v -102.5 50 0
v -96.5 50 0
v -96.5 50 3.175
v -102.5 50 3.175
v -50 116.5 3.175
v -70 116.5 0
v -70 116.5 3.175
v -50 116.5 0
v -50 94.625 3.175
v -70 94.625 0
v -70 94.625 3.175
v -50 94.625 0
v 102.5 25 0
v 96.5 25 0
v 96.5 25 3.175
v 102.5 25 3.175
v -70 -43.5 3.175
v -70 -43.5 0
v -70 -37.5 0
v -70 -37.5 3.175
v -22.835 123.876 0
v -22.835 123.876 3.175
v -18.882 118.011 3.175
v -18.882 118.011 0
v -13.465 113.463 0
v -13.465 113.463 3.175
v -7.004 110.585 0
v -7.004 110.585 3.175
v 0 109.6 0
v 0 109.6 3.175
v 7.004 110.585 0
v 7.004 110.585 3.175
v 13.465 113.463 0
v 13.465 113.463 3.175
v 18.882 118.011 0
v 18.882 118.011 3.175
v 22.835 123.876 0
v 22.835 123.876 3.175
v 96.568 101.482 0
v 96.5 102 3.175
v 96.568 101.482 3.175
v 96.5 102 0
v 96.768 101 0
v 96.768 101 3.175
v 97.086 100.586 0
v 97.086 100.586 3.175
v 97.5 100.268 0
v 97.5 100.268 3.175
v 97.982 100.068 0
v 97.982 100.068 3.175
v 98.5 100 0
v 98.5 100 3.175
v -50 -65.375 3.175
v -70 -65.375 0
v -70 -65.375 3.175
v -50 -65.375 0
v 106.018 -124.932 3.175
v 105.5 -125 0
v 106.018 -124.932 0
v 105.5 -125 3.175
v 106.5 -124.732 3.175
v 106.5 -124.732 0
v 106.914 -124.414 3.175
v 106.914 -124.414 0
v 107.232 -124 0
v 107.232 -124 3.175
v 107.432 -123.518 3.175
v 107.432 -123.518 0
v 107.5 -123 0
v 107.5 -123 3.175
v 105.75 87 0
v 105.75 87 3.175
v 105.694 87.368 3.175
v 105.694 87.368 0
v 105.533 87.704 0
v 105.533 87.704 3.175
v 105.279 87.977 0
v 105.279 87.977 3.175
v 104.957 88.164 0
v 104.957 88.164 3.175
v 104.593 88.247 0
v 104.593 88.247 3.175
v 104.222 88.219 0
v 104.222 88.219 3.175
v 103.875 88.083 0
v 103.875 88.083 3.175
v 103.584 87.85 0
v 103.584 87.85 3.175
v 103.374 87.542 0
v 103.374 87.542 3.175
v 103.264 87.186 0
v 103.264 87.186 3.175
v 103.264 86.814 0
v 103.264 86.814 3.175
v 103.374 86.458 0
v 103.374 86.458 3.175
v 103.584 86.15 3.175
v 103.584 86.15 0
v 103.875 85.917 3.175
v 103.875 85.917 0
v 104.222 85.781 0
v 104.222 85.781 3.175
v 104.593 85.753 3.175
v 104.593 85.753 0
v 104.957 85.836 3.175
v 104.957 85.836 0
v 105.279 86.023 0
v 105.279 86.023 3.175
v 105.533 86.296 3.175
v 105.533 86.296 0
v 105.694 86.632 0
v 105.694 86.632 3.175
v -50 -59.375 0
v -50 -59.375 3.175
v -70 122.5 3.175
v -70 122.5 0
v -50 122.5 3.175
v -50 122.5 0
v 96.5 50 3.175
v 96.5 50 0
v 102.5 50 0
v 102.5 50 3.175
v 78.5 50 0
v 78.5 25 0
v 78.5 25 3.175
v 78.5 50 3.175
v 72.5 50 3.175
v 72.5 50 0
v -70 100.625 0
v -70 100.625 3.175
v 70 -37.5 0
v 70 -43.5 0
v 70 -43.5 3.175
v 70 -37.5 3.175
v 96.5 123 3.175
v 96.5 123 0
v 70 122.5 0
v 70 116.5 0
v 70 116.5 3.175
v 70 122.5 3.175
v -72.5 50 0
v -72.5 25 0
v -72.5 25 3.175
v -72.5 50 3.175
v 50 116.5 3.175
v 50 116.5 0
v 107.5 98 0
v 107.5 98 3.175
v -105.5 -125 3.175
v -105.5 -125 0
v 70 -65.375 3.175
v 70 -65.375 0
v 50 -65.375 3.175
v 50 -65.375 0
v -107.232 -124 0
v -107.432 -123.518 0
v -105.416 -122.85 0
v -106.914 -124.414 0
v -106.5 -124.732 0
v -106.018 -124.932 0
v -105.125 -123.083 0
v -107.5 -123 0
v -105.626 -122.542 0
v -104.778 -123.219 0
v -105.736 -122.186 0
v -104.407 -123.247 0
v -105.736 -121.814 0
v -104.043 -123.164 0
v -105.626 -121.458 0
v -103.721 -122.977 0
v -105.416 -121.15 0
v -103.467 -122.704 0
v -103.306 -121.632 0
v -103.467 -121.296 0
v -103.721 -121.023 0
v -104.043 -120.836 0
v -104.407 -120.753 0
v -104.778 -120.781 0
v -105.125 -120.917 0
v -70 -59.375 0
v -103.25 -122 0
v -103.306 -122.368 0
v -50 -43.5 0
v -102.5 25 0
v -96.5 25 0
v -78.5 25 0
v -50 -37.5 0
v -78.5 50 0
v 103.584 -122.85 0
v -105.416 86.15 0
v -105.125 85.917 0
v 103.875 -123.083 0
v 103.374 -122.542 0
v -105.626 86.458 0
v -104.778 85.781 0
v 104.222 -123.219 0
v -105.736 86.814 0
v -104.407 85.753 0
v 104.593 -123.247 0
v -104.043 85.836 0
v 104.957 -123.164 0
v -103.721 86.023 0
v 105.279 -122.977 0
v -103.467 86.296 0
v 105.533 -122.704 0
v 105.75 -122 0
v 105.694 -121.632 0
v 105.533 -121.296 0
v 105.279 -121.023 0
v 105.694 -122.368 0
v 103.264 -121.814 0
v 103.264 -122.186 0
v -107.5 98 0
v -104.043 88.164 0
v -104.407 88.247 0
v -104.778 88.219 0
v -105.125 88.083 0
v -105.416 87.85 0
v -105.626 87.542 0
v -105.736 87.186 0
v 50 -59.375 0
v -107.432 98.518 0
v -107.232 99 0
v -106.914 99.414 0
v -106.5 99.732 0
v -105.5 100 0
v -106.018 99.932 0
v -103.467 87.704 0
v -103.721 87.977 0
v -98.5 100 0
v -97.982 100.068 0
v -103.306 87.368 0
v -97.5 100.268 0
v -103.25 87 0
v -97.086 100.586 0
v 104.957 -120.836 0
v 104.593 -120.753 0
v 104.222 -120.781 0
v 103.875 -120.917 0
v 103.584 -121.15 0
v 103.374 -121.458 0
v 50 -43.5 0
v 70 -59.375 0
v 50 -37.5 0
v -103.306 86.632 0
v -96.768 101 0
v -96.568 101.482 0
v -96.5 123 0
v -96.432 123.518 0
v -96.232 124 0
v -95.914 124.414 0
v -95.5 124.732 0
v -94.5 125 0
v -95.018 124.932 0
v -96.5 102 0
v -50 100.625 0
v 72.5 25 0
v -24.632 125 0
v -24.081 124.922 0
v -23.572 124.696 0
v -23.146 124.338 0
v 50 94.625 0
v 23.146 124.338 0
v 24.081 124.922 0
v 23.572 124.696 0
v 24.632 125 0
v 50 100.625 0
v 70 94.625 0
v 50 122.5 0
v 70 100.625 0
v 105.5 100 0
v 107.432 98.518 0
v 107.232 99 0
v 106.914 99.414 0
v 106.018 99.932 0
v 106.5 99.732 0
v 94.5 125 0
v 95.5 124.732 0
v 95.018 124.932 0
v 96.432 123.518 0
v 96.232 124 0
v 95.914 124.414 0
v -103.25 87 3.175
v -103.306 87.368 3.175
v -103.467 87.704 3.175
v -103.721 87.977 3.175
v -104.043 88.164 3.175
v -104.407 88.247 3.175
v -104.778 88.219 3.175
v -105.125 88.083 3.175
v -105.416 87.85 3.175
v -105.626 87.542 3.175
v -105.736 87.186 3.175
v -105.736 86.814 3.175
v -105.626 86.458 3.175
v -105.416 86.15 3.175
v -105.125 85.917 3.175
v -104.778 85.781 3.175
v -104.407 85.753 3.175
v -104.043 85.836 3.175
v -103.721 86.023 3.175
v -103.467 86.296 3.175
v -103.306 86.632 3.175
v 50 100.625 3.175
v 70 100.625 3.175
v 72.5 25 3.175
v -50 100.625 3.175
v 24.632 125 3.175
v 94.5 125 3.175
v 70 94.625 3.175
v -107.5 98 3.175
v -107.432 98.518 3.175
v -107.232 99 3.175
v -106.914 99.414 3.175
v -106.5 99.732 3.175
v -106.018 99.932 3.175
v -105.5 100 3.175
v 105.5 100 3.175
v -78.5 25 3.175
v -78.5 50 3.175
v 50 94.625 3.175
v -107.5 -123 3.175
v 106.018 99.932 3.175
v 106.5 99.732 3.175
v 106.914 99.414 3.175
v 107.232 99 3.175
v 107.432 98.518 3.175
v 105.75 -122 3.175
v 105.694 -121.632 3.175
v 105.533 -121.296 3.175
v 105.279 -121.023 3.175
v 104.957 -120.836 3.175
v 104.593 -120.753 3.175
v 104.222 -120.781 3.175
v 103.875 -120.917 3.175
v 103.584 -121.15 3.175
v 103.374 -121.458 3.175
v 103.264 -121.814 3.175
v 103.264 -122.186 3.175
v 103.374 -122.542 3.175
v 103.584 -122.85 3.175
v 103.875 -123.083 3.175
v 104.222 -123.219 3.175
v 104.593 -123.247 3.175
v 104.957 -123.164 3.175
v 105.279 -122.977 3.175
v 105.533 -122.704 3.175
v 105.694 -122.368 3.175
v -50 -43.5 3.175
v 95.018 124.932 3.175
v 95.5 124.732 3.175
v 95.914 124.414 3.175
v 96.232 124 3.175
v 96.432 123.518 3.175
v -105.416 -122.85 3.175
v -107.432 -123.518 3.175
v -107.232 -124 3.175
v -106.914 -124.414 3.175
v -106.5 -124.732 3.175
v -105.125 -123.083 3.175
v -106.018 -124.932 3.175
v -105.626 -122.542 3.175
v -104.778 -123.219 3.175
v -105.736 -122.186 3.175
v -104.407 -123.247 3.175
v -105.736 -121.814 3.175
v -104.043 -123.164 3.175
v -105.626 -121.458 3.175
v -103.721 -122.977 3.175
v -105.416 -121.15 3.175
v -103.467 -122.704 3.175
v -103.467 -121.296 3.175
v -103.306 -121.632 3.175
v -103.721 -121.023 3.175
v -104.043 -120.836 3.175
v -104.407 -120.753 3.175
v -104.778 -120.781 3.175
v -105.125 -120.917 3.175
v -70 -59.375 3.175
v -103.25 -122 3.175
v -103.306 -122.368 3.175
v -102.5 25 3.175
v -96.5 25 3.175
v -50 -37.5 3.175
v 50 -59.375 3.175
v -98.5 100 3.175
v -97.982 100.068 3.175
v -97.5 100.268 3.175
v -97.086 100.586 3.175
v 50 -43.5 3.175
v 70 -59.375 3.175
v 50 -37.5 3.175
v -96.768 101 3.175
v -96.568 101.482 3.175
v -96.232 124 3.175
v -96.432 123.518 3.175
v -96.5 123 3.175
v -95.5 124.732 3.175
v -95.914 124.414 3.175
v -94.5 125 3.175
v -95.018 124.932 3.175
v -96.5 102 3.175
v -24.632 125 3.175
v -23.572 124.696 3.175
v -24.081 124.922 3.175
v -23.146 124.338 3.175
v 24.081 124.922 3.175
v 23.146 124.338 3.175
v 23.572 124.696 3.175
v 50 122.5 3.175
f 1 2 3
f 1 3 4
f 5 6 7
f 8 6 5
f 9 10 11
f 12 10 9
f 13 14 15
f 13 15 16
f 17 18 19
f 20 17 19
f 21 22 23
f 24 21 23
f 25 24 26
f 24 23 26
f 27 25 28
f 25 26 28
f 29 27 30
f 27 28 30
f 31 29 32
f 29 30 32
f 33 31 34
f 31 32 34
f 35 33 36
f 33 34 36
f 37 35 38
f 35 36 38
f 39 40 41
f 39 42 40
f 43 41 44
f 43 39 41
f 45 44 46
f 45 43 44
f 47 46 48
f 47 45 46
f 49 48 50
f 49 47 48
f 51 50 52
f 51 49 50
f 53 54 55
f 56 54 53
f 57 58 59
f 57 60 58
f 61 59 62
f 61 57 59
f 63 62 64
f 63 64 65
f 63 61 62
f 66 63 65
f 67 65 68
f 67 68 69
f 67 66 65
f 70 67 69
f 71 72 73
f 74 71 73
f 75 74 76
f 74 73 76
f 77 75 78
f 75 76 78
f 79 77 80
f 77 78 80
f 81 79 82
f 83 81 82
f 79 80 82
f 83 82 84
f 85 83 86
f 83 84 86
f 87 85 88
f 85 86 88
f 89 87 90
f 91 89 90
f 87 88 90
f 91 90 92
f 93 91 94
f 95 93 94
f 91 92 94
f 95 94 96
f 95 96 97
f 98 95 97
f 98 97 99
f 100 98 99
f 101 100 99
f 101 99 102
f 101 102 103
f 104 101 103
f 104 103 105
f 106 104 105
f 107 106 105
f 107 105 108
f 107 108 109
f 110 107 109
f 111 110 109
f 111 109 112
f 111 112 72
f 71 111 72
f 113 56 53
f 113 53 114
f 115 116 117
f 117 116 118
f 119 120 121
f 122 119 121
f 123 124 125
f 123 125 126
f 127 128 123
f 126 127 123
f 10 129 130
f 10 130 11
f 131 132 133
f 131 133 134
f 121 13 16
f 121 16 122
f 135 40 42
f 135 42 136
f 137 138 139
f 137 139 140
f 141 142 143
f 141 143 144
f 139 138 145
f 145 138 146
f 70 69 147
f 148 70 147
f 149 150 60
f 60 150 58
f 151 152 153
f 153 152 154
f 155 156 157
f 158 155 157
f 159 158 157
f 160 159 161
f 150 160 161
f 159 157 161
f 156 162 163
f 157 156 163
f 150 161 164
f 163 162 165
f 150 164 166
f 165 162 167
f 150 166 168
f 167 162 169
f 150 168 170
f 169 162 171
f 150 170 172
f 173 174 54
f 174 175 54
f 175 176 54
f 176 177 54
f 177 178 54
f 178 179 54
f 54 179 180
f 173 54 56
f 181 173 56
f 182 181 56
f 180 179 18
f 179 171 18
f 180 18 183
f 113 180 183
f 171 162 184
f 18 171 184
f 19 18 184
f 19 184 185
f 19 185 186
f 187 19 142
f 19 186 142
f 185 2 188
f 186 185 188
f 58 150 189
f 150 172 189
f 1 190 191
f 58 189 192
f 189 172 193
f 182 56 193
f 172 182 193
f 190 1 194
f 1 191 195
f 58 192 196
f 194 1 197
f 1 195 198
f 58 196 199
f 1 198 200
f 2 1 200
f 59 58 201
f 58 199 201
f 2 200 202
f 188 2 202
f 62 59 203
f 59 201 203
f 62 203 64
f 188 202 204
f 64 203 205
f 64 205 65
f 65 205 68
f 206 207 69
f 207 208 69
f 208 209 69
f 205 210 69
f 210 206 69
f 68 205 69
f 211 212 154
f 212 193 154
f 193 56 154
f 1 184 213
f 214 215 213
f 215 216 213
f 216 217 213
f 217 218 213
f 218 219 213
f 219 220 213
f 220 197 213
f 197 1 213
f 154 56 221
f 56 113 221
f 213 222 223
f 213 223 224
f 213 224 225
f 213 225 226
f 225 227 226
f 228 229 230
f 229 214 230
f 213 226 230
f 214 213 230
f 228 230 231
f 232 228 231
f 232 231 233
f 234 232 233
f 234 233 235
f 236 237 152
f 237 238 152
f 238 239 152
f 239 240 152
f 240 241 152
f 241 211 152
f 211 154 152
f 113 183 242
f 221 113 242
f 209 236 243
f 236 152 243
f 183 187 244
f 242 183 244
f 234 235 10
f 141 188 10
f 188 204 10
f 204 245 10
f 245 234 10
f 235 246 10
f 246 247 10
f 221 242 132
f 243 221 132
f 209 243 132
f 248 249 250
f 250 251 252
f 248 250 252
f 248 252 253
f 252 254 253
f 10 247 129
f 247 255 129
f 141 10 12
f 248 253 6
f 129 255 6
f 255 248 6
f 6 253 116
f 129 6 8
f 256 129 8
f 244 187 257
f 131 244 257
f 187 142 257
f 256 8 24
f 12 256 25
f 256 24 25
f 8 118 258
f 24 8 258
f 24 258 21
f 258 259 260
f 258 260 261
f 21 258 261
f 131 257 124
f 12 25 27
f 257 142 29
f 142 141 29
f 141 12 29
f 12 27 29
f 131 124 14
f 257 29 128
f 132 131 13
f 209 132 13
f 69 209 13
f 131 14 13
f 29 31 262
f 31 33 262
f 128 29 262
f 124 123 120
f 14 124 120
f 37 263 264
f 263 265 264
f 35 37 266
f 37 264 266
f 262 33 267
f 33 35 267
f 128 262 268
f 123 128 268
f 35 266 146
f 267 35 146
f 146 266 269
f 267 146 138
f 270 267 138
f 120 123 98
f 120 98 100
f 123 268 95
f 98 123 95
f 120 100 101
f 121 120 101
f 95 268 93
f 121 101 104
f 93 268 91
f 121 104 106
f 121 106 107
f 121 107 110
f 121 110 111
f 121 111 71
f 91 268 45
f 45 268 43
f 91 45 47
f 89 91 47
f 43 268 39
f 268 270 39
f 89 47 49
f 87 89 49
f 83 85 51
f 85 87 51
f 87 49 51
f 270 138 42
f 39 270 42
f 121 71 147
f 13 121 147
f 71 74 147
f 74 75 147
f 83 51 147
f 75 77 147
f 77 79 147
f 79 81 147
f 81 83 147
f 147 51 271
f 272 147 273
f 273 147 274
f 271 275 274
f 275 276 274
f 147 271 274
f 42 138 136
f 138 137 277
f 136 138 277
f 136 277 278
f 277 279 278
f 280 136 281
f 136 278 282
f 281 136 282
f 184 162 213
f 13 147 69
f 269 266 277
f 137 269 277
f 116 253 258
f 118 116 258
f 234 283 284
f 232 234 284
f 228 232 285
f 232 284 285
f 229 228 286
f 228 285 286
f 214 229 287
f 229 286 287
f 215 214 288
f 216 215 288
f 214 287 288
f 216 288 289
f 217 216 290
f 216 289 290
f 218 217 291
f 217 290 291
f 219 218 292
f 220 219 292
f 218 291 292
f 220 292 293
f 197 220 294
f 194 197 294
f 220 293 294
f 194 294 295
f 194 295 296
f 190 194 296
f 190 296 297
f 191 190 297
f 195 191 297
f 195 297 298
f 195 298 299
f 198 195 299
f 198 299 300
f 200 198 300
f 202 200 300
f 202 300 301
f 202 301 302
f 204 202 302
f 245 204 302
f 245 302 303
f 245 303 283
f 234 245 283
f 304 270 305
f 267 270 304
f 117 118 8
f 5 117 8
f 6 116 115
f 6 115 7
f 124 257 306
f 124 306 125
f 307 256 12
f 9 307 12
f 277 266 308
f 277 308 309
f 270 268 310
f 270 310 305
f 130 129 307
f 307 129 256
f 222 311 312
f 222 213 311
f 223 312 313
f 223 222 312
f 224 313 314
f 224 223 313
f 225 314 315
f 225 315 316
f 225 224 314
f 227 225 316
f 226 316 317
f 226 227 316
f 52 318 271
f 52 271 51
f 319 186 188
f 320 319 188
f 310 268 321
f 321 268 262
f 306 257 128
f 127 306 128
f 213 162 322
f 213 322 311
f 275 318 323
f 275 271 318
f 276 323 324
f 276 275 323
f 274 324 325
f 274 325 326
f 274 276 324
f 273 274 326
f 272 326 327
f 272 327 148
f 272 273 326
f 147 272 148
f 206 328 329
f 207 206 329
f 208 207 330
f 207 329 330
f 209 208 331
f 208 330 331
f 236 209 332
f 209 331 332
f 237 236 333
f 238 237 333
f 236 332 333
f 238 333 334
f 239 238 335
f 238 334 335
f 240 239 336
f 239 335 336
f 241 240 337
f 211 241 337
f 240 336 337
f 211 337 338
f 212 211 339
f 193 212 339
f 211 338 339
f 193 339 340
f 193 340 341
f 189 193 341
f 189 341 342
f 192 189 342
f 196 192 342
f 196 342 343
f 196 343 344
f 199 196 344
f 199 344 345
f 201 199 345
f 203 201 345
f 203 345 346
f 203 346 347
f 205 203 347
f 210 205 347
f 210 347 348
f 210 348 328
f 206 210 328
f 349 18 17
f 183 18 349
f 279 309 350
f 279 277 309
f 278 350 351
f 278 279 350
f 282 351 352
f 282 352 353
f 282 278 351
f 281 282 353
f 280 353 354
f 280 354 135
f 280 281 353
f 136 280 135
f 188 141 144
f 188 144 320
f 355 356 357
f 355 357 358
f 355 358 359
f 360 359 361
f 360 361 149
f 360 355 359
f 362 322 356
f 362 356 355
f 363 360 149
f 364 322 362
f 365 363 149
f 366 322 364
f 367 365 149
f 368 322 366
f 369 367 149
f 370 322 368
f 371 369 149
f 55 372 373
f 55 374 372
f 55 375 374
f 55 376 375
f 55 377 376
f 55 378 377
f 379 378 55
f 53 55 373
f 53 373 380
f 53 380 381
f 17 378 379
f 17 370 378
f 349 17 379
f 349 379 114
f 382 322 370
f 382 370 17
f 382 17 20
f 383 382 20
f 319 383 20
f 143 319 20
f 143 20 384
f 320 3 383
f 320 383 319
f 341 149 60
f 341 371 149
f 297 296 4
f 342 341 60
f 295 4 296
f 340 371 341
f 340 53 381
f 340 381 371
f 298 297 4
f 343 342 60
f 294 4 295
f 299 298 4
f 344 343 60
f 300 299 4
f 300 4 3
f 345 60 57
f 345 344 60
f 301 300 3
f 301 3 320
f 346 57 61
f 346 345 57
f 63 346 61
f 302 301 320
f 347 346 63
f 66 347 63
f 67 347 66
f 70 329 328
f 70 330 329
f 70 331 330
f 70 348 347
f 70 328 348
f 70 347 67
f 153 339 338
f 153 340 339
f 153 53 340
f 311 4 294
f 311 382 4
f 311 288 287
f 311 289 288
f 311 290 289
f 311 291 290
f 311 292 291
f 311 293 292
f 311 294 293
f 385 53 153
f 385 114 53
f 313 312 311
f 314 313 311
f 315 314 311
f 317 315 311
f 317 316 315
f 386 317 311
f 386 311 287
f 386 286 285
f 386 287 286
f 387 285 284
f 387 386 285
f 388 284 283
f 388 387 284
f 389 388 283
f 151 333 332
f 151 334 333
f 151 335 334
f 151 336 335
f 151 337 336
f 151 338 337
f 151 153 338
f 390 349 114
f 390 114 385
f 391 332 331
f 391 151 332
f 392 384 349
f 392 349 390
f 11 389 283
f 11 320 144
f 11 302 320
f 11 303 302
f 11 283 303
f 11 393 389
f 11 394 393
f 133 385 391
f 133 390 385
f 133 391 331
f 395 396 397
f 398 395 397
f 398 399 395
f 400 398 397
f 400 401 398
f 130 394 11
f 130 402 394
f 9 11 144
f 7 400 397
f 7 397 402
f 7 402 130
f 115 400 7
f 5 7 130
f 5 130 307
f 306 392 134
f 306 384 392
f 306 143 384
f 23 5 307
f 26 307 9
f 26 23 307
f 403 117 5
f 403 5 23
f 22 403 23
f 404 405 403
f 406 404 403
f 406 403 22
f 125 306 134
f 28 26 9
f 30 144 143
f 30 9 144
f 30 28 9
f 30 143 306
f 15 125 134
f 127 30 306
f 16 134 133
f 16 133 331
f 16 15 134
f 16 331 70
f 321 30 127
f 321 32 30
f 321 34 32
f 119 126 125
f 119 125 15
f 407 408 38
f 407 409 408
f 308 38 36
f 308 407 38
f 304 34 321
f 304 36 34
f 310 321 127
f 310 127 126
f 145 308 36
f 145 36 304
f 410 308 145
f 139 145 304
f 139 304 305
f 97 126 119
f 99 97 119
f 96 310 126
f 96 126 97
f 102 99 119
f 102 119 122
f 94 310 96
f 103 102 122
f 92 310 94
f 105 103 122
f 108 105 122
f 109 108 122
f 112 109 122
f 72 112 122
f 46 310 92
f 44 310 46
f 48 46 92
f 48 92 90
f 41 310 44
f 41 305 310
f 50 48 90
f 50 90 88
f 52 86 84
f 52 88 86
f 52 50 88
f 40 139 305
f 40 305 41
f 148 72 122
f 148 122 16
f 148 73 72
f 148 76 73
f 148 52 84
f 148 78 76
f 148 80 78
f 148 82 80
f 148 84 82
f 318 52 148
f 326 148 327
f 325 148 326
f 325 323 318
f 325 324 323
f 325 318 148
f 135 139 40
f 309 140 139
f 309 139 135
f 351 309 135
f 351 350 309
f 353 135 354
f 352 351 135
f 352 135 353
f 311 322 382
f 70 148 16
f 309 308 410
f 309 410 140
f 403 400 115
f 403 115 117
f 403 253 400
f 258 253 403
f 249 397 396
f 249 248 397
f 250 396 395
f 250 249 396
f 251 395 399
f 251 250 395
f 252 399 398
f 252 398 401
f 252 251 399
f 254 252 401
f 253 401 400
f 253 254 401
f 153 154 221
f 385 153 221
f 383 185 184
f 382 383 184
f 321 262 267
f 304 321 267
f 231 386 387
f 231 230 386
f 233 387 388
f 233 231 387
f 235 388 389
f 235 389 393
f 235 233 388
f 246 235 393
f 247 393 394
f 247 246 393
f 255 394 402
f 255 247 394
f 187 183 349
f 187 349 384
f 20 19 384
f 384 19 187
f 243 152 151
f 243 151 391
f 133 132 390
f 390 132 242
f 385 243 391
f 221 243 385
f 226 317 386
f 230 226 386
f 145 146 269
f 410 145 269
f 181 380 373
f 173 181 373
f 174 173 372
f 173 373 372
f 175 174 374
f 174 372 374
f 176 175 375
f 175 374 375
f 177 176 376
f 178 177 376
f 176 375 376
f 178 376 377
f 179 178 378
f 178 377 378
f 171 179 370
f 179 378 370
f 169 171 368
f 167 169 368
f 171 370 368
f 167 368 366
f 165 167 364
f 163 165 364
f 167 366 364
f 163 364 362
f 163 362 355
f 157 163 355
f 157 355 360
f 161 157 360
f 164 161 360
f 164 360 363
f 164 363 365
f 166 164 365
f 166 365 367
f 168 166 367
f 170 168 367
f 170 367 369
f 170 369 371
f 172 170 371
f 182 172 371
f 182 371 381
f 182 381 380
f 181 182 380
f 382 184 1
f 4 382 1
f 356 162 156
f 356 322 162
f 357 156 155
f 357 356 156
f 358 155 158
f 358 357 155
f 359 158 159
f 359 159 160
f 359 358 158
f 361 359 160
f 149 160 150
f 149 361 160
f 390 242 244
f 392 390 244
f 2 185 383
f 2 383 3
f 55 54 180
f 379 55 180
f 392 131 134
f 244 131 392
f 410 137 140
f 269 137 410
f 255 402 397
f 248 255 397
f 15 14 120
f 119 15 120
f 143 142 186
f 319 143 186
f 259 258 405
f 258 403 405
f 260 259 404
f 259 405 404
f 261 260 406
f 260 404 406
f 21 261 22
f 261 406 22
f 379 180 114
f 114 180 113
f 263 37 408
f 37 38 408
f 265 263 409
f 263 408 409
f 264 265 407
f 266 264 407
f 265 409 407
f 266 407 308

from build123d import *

# Parameters (mm, degrees)
SKETCH1_W                 = 215
SKETCH1_H                 = 250
BOSS_EXTRUDE1_DEPTH       = 3.175
SKETCH2_R                 = 25.4
CUT_EXTRUDE1_DEPTH        = 165.897940027
SKETCH3_W                 = 11
SKETCH3_H                 = 25
CUT_EXTRUDE2_DEPTH        = 165.897940027
FILLET1_R                 = 2
SKETCH4_W                 = 20
SKETCH4_H                 = 6
CUT_EXTRUDE3_DEPTH        = 165.897940027
LPATTERN1_COUNT           = 2
LPATTERN1_PITCH           = 160
LPATTERN1_COPY_1_SKETCH_W = 20
LPATTERN1_COPY_1_SKETCH_H = 6
LPATTERN1_COPY_1_DEPTH    = 165.897940027
M3X0_5_TAPPED_HOLE1_D     = 2.5
SKETCH9_W                 = 6
SKETCH9_H                 = 25
CUT_EXTRUDE4_DEPTH        = 165.897940027


with BuildPart() as part:
    # Sketch1 → Boss-Extrude1 (new body)
    with BuildSketch(Plane.XY):
        Rectangle(SKETCH1_W, SKETCH1_H)
    extrude(amount=BOSS_EXTRUDE1_DEPTH)

    # Sketch2 → Cut-Extrude1 (cut, through all)
    with BuildSketch(Plane.XY.offset(3.175)):
        with Locations((0, 135)):
            Circle(SKETCH2_R)
    extrude(amount=-CUT_EXTRUDE1_DEPTH, mode=Mode.SUBTRACT)

    # Sketch3 → Cut-Extrude2 (cut, through all)
    with BuildSketch(Plane.XY.offset(3.175)):
        with Locations((-102, 112.5)):
            Rectangle(SKETCH3_W, SKETCH3_H)
    cut_extrude2 = extrude(amount=-CUT_EXTRUDE2_DEPTH, mode=Mode.SUBTRACT)

    # Mirror1: Cut-Extrude2 across plane
    add(cut_extrude2.mirror(Plane(origin=(0, 0, 0), x_dir=(0, 0, 1), z_dir=(1, 0, 0))), mode=Mode.SUBTRACT)

    # Fillet1
    fillet1_edges = [part.edges().sort_by_distance(p)[0] for p in [
        (23.348661632, 125, 1.5875),
        (-23.348661632, 125, 1.5875),
        (-107.5, 100, 1.5875),
        (-96.5, 125, 1.5875),
        (-96.5, 100, 1.5875),
        (107.5, 100, 1.5875),
        (96.5, 100, 1.5875),
        (96.5, 125, 1.5875),
        (107.5, -125, 1.5875),
        (-107.5, -125, 1.5875),
    ]]
    fillet(fillet1_edges, radius=FILLET1_R)

    # Sketch4 → Cut-Extrude3 (cut, through all)
    with BuildSketch(Plane(origin=(0, 0, 0), x_dir=(-1, 0, 0), z_dir=(0, 0, -1))):
        with Locations((-60, -40.5)):
            Rectangle(SKETCH4_W, SKETCH4_H)
        with Locations((-60, -62.375)):
            Rectangle(SKETCH4_W, SKETCH4_H)
    cut_extrude3 = extrude(amount=-CUT_EXTRUDE3_DEPTH, mode=Mode.SUBTRACT)

    # Mirror2: Cut-Extrude3 across plane
    add(cut_extrude3.mirror(Plane(origin=(0, 0, 0), x_dir=(0, 0, 1), z_dir=(1, 0, 0))), mode=Mode.SUBTRACT)

    # LPattern1: Cut-Extrude3 ×2
    with Locations(*[(0, i * LPATTERN1_PITCH, 0) for i in range(1, LPATTERN1_COUNT)]):
        add(cut_extrude3, mode=Mode.SUBTRACT)

    # LPattern1 copy 1 sketch → LPattern1 copy 1 (cut, through all)
    with BuildSketch(Plane(origin=(0, 160, 0), x_dir=(1, 0, 0), z_dir=(0, 0, -1))):
        with Locations((-60, 40.5)):
            Rectangle(LPATTERN1_COPY_1_SKETCH_W, LPATTERN1_COPY_1_SKETCH_H)
        with Locations((-60, 62.375)):
            Rectangle(LPATTERN1_COPY_1_SKETCH_W, LPATTERN1_COPY_1_SKETCH_H)
    extrude(amount=-LPATTERN1_COPY_1_DEPTH, mode=Mode.SUBTRACT)

    # M3x0.5 Tapped Hole1 (through all)
    with Locations(Plane(origin=(0, 0, 0), x_dir=(-1, 0, 0), z_dir=(0, 0, -1))):
        with Locations((-104.5, 87), (104.5, 87), (104.5, -122), (-104.5, -122)):
            Hole(M3X0_5_TAPPED_HOLE1_D / 2)

    # Sketch9 → Cut-Extrude4 (cut, through all)
    with BuildSketch(Plane(origin=(0, 0, 0), x_dir=(-1, 0, 0), z_dir=(0, 0, -1))):
        with Locations((75.5, 37.5)):
            Rectangle(SKETCH9_W, SKETCH9_H)
        with Locations((99.5, 37.5)):
            Rectangle(SKETCH9_W, SKETCH9_H)
    cut_extrude4 = extrude(amount=-CUT_EXTRUDE4_DEPTH, mode=Mode.SUBTRACT)

    # Mirror3: Cut-Extrude4 across plane
    add(cut_extrude4.mirror(Plane(origin=(0, 0, 0), x_dir=(0, 0, 1), z_dir=(1, 0, 0))), mode=Mode.SUBTRACT)


solid = part.part
